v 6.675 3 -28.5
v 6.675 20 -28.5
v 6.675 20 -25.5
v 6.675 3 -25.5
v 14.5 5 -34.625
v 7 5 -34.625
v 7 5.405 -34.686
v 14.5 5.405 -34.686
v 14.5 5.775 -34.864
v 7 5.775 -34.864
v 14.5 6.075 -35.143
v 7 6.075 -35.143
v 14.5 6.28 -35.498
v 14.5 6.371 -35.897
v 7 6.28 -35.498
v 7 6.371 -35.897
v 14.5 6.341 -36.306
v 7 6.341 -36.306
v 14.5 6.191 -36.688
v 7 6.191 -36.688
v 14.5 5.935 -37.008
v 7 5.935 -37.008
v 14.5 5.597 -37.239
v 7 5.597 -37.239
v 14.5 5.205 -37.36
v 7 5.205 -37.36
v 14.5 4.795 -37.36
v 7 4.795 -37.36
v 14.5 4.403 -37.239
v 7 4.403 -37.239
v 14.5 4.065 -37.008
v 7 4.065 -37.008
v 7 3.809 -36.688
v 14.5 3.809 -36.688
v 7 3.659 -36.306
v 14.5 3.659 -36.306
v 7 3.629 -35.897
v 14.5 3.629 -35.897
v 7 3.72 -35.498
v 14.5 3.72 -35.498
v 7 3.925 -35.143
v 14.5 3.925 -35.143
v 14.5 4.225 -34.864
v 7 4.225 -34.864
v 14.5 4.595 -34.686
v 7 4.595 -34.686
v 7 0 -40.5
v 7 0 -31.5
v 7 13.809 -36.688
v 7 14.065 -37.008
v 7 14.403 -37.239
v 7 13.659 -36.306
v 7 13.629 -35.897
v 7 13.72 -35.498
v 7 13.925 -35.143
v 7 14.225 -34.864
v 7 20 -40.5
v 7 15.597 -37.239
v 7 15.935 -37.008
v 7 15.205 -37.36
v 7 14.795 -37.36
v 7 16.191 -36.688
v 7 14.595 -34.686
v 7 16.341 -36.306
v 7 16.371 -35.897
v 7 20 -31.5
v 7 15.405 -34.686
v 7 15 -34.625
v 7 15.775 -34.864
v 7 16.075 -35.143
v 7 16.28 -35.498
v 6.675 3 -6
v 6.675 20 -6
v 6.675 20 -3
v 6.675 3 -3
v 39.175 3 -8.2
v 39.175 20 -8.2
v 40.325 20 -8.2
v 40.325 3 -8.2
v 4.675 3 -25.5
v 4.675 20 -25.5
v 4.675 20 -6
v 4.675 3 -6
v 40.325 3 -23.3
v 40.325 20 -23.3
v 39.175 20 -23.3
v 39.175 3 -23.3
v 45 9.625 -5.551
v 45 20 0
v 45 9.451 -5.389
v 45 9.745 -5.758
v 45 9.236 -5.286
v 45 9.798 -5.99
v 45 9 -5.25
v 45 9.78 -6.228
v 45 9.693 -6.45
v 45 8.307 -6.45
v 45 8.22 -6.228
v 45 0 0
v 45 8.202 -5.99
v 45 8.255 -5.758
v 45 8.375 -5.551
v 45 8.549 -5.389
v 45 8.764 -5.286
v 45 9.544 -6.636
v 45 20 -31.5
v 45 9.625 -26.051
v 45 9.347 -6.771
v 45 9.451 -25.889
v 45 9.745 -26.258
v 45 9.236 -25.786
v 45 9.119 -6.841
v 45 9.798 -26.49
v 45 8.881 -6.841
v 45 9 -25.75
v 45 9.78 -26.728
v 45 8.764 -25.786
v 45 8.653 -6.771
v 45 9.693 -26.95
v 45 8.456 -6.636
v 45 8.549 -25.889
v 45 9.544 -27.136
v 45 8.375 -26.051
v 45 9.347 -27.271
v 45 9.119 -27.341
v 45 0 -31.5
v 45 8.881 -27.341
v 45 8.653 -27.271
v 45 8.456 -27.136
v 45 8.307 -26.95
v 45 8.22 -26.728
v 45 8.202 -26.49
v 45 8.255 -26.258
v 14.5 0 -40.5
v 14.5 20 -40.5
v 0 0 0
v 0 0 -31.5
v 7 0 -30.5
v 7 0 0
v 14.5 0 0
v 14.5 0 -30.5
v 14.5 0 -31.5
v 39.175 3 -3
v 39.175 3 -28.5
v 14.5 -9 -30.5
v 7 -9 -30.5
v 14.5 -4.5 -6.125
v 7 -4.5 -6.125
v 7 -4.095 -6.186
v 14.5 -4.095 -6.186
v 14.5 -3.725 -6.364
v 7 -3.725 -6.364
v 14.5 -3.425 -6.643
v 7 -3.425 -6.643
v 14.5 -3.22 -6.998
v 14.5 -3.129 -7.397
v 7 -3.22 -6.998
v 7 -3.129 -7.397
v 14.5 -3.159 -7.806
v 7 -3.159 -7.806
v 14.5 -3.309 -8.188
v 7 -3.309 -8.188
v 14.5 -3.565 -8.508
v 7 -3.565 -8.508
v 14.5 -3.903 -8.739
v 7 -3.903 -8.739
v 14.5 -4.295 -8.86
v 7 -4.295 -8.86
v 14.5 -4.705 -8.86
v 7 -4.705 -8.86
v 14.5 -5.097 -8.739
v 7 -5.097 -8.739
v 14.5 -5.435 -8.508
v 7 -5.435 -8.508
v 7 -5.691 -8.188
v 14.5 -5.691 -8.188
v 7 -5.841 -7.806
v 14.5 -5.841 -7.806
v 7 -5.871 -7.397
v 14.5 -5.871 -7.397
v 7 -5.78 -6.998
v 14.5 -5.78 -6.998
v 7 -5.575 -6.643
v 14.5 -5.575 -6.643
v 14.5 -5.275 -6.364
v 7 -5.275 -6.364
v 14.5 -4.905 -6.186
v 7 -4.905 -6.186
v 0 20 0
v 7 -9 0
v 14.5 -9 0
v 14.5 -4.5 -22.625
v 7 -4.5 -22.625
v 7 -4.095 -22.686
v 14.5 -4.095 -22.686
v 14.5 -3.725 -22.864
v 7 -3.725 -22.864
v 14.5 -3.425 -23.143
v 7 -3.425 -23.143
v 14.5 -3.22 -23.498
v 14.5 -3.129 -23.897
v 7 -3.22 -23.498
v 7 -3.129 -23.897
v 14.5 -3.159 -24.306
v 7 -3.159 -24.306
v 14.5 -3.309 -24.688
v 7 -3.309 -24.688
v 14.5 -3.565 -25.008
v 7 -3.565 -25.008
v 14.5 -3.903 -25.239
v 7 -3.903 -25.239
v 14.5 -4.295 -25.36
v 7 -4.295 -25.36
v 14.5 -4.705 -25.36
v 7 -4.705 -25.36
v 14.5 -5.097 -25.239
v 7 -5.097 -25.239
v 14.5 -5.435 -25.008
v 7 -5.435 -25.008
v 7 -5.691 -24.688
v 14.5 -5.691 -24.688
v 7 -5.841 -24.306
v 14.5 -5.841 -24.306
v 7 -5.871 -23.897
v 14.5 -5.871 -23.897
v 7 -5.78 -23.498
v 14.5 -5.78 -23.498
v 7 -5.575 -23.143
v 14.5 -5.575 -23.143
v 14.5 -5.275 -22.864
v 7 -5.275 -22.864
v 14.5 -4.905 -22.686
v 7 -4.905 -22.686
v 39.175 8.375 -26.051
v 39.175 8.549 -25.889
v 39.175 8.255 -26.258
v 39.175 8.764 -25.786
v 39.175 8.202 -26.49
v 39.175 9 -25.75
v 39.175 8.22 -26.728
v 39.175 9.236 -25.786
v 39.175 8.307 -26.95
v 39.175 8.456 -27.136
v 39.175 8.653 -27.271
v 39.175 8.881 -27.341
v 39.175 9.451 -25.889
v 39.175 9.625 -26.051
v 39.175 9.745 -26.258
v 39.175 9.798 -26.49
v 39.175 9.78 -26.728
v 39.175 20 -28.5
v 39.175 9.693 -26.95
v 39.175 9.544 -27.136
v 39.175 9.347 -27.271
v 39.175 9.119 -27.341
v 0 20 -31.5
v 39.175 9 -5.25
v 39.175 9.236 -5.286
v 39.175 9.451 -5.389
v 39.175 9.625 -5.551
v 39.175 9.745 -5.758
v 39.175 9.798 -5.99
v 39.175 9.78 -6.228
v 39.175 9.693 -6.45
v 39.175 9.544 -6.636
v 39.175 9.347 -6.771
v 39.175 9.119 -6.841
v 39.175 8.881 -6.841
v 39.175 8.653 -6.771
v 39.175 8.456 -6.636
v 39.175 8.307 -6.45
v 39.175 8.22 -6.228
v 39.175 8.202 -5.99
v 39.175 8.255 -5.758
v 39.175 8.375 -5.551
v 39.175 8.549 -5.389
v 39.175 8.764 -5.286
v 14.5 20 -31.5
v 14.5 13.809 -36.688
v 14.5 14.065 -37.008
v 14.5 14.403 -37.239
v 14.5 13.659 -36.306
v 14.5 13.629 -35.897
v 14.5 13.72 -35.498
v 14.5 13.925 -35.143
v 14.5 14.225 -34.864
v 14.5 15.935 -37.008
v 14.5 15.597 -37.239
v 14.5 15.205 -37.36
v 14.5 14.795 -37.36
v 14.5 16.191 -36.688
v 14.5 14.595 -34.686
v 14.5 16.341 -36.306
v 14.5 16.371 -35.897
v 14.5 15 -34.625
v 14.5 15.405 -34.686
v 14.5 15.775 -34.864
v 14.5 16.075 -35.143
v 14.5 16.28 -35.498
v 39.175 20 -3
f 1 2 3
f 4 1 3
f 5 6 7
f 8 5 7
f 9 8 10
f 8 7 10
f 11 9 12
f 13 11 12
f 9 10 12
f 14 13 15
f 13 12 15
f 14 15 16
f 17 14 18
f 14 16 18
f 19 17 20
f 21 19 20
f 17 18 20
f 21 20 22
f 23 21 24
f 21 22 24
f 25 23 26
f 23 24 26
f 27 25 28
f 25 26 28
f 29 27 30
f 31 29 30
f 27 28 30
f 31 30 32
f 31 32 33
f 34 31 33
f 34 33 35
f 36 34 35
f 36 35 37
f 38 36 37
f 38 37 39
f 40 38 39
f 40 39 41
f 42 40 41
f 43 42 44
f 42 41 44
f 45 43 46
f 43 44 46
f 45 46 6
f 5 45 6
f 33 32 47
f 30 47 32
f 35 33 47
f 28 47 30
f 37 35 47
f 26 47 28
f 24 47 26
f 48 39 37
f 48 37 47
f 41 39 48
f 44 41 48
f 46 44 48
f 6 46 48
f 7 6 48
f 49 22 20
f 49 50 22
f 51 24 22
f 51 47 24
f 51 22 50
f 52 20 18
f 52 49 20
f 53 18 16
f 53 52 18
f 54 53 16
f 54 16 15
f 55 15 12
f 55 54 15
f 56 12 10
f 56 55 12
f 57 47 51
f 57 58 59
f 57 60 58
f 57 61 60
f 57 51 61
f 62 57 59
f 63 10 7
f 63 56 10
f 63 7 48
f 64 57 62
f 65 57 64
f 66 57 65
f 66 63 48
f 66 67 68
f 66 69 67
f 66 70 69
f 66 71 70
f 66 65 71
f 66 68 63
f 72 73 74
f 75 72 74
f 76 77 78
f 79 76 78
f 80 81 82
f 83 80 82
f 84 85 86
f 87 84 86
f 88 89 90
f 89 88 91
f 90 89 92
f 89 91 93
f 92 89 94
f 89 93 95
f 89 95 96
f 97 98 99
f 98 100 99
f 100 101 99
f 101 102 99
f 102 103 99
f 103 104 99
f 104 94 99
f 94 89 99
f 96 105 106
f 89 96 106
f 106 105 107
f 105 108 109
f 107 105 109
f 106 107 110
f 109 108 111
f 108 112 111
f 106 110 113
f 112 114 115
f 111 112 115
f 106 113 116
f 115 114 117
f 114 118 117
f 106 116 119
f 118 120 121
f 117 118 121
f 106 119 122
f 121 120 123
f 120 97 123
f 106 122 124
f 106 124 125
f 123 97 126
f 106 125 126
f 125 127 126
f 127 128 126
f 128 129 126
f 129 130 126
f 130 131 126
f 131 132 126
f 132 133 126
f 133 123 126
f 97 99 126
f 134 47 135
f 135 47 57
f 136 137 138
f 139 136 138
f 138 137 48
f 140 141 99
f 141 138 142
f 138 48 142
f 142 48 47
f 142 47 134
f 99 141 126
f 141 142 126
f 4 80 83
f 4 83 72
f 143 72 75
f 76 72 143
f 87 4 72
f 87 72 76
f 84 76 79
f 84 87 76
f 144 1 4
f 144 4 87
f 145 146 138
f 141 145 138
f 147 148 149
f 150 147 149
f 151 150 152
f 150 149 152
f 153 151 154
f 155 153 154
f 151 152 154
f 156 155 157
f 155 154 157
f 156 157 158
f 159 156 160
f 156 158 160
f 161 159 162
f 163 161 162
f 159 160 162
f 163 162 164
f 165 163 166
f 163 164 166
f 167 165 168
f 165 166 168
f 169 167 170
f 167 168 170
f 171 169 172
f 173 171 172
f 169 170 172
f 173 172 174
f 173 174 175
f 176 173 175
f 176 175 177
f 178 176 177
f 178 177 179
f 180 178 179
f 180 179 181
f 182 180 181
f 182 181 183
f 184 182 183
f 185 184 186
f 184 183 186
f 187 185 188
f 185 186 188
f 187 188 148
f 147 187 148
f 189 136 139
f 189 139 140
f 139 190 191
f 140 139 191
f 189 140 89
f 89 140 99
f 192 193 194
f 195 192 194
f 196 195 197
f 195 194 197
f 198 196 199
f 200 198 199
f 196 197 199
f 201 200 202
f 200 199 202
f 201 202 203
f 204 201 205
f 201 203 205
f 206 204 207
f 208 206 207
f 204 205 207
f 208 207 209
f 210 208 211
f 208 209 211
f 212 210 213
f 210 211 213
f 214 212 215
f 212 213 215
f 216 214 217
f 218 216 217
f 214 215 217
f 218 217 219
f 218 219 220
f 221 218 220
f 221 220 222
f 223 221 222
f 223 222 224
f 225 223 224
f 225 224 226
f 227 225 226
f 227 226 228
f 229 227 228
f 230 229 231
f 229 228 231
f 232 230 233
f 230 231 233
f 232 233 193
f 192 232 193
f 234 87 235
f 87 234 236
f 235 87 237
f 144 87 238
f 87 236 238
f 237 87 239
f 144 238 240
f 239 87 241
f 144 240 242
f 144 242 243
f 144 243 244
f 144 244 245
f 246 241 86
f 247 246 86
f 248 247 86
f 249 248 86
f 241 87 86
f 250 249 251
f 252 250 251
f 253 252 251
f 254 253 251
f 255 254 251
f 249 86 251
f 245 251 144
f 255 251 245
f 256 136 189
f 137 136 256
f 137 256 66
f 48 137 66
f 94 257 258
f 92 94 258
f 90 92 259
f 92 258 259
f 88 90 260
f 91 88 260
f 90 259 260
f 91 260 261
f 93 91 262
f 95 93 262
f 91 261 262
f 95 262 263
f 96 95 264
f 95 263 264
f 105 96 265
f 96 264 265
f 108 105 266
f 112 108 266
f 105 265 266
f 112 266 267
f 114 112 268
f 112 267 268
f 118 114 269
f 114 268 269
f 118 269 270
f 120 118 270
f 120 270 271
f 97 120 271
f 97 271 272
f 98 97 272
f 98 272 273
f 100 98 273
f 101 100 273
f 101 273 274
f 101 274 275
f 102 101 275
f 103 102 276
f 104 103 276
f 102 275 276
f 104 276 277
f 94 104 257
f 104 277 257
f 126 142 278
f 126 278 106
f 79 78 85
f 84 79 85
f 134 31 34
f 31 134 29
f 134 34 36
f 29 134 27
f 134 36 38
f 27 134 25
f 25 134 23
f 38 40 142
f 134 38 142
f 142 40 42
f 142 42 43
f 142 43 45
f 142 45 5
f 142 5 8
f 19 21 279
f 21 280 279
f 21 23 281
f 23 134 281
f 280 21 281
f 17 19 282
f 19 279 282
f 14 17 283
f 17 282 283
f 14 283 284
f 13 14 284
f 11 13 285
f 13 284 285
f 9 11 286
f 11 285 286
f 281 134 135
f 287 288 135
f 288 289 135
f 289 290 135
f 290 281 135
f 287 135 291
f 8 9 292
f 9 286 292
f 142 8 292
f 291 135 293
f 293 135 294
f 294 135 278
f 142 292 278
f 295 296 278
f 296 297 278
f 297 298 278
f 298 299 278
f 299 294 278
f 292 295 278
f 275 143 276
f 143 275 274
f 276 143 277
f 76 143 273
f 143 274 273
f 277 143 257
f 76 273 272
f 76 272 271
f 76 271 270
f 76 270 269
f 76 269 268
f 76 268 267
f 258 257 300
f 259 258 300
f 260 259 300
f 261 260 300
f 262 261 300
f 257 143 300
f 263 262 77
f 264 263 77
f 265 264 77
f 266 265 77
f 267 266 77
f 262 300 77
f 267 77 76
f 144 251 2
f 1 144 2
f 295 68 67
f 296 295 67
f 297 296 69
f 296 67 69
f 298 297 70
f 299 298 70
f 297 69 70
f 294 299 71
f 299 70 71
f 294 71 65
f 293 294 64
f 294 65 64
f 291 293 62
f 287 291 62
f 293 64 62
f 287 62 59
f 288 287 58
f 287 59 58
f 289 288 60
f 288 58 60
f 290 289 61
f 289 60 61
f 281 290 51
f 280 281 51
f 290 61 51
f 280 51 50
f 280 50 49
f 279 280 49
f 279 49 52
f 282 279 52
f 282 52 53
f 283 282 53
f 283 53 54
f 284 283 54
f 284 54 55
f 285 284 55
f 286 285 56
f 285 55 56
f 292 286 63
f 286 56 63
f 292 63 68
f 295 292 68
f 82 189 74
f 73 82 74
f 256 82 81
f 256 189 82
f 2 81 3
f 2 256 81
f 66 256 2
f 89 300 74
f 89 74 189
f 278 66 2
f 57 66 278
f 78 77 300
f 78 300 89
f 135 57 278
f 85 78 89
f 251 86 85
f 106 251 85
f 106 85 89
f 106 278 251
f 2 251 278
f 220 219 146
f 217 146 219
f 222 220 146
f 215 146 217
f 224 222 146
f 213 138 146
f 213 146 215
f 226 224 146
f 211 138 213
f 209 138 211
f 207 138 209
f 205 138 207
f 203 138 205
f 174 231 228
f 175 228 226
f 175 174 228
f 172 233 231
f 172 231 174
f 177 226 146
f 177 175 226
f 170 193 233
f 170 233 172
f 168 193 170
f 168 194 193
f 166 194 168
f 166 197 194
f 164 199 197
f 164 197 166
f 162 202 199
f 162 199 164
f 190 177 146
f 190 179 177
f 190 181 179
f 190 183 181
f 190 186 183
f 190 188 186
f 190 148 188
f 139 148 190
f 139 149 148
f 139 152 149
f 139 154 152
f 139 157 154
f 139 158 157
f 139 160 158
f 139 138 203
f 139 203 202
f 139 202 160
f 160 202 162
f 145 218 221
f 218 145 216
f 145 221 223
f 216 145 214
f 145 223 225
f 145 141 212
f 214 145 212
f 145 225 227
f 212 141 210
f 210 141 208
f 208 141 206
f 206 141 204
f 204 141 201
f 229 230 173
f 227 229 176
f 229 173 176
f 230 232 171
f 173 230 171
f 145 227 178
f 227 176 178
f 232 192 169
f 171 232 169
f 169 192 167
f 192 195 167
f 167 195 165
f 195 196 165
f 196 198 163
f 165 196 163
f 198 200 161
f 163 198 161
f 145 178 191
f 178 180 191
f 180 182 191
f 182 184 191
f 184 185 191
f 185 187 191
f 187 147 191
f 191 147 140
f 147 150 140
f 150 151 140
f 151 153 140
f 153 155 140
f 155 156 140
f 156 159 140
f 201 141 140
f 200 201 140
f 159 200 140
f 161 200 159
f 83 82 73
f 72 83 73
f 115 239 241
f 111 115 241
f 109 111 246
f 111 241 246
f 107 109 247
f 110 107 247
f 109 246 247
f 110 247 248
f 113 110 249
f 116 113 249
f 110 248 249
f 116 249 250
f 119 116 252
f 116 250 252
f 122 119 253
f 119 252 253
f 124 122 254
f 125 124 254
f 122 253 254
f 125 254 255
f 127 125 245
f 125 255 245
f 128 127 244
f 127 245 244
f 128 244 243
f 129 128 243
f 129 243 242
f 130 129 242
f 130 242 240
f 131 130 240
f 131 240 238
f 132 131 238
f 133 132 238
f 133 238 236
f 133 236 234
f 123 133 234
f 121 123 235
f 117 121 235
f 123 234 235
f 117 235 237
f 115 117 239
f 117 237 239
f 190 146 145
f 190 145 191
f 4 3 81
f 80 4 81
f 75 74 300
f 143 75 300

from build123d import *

# Parameters (mm, degrees)
SKETCH1_W           = 45
SKETCH1_H           = 31.5
BOSS_EXTRUDE1_DEPTH = 20
CUT_EXTRUDE1_DEPTH  = 17
SKETCH3_R           = 0.8
CUT_EXTRUDE2_DEPTH  = 5.825
BOSS_EXTRUDE2_START = -7
SKETCH5_W           = 30.5
SKETCH5_H           = 9
SKETCH5_R           = 1.375
SKETCH5_W_2         = 9
SKETCH5_H_2         = 20
BOSS_EXTRUDE2_DEPTH = 7.5


with BuildPart() as part:
    # Sketch1 → Boss-Extrude1 (new body)
    with BuildSketch(Plane(origin=(0, 0, 0), x_dir=(1, 0, 0), z_dir=(0, 1, 0))):
        with Locations((22.5, 15.75)):
            Rectangle(SKETCH1_W, SKETCH1_H)
    extrude(amount=BOSS_EXTRUDE1_DEPTH)

    # Sketch2 → Cut-Extrude1 (cut)
    with BuildSketch(Plane(origin=(0, 20, 0), x_dir=(1, 0, 0), z_dir=(0, 1, 0))):
        Polygon((39.175, 28.5), (6.675, 28.5), (6.675, 25.5), (4.675, 25.5), (4.675, 6), (6.675, 6), (6.675, 3), (39.175, 3), (39.175, 8.2), (40.325, 8.2), (40.325, 23.3), (39.175, 23.3), align=None)
    extrude(amount=-CUT_EXTRUDE1_DEPTH, mode=Mode.SUBTRACT)

    # Sketch3 → Cut-Extrude2 (cut)
    with BuildSketch(Plane.ZY.offset(-39.175)):
        with Locations((-26.55, 9)):
            Circle(SKETCH3_R)
        with Locations((-6.05, 9)):
            Circle(SKETCH3_R)
    extrude(amount=-CUT_EXTRUDE2_DEPTH, mode=Mode.SUBTRACT)

    # Sketch5 → Boss-Extrude2 (add)
    # profile 1 of 2: a face of its own
    with BuildSketch(Plane.ZY.offset(BOSS_EXTRUDE2_START)):
        with Locations((-15.25, -4.5)):
            Rectangle(SKETCH5_W, SKETCH5_H)
        with Locations((-24, -4.5)):
            Circle(SKETCH5_R, mode=Mode.SUBTRACT)
        with Locations((-7.5, -4.5)):
            Circle(SKETCH5_R, mode=Mode.SUBTRACT)
    # profile 2 of 2: a face of its own
    with BuildSketch(Plane.ZY.offset(BOSS_EXTRUDE2_START)):
        with Locations((-36, 10)):
            Rectangle(SKETCH5_W_2, SKETCH5_H_2)
        with Locations((-36, 5)):
            Circle(SKETCH5_R, mode=Mode.SUBTRACT)
        with Locations((-36, 15)):
            Circle(SKETCH5_R, mode=Mode.SUBTRACT)
    extrude(amount=-BOSS_EXTRUDE2_DEPTH)


solid = part.part
